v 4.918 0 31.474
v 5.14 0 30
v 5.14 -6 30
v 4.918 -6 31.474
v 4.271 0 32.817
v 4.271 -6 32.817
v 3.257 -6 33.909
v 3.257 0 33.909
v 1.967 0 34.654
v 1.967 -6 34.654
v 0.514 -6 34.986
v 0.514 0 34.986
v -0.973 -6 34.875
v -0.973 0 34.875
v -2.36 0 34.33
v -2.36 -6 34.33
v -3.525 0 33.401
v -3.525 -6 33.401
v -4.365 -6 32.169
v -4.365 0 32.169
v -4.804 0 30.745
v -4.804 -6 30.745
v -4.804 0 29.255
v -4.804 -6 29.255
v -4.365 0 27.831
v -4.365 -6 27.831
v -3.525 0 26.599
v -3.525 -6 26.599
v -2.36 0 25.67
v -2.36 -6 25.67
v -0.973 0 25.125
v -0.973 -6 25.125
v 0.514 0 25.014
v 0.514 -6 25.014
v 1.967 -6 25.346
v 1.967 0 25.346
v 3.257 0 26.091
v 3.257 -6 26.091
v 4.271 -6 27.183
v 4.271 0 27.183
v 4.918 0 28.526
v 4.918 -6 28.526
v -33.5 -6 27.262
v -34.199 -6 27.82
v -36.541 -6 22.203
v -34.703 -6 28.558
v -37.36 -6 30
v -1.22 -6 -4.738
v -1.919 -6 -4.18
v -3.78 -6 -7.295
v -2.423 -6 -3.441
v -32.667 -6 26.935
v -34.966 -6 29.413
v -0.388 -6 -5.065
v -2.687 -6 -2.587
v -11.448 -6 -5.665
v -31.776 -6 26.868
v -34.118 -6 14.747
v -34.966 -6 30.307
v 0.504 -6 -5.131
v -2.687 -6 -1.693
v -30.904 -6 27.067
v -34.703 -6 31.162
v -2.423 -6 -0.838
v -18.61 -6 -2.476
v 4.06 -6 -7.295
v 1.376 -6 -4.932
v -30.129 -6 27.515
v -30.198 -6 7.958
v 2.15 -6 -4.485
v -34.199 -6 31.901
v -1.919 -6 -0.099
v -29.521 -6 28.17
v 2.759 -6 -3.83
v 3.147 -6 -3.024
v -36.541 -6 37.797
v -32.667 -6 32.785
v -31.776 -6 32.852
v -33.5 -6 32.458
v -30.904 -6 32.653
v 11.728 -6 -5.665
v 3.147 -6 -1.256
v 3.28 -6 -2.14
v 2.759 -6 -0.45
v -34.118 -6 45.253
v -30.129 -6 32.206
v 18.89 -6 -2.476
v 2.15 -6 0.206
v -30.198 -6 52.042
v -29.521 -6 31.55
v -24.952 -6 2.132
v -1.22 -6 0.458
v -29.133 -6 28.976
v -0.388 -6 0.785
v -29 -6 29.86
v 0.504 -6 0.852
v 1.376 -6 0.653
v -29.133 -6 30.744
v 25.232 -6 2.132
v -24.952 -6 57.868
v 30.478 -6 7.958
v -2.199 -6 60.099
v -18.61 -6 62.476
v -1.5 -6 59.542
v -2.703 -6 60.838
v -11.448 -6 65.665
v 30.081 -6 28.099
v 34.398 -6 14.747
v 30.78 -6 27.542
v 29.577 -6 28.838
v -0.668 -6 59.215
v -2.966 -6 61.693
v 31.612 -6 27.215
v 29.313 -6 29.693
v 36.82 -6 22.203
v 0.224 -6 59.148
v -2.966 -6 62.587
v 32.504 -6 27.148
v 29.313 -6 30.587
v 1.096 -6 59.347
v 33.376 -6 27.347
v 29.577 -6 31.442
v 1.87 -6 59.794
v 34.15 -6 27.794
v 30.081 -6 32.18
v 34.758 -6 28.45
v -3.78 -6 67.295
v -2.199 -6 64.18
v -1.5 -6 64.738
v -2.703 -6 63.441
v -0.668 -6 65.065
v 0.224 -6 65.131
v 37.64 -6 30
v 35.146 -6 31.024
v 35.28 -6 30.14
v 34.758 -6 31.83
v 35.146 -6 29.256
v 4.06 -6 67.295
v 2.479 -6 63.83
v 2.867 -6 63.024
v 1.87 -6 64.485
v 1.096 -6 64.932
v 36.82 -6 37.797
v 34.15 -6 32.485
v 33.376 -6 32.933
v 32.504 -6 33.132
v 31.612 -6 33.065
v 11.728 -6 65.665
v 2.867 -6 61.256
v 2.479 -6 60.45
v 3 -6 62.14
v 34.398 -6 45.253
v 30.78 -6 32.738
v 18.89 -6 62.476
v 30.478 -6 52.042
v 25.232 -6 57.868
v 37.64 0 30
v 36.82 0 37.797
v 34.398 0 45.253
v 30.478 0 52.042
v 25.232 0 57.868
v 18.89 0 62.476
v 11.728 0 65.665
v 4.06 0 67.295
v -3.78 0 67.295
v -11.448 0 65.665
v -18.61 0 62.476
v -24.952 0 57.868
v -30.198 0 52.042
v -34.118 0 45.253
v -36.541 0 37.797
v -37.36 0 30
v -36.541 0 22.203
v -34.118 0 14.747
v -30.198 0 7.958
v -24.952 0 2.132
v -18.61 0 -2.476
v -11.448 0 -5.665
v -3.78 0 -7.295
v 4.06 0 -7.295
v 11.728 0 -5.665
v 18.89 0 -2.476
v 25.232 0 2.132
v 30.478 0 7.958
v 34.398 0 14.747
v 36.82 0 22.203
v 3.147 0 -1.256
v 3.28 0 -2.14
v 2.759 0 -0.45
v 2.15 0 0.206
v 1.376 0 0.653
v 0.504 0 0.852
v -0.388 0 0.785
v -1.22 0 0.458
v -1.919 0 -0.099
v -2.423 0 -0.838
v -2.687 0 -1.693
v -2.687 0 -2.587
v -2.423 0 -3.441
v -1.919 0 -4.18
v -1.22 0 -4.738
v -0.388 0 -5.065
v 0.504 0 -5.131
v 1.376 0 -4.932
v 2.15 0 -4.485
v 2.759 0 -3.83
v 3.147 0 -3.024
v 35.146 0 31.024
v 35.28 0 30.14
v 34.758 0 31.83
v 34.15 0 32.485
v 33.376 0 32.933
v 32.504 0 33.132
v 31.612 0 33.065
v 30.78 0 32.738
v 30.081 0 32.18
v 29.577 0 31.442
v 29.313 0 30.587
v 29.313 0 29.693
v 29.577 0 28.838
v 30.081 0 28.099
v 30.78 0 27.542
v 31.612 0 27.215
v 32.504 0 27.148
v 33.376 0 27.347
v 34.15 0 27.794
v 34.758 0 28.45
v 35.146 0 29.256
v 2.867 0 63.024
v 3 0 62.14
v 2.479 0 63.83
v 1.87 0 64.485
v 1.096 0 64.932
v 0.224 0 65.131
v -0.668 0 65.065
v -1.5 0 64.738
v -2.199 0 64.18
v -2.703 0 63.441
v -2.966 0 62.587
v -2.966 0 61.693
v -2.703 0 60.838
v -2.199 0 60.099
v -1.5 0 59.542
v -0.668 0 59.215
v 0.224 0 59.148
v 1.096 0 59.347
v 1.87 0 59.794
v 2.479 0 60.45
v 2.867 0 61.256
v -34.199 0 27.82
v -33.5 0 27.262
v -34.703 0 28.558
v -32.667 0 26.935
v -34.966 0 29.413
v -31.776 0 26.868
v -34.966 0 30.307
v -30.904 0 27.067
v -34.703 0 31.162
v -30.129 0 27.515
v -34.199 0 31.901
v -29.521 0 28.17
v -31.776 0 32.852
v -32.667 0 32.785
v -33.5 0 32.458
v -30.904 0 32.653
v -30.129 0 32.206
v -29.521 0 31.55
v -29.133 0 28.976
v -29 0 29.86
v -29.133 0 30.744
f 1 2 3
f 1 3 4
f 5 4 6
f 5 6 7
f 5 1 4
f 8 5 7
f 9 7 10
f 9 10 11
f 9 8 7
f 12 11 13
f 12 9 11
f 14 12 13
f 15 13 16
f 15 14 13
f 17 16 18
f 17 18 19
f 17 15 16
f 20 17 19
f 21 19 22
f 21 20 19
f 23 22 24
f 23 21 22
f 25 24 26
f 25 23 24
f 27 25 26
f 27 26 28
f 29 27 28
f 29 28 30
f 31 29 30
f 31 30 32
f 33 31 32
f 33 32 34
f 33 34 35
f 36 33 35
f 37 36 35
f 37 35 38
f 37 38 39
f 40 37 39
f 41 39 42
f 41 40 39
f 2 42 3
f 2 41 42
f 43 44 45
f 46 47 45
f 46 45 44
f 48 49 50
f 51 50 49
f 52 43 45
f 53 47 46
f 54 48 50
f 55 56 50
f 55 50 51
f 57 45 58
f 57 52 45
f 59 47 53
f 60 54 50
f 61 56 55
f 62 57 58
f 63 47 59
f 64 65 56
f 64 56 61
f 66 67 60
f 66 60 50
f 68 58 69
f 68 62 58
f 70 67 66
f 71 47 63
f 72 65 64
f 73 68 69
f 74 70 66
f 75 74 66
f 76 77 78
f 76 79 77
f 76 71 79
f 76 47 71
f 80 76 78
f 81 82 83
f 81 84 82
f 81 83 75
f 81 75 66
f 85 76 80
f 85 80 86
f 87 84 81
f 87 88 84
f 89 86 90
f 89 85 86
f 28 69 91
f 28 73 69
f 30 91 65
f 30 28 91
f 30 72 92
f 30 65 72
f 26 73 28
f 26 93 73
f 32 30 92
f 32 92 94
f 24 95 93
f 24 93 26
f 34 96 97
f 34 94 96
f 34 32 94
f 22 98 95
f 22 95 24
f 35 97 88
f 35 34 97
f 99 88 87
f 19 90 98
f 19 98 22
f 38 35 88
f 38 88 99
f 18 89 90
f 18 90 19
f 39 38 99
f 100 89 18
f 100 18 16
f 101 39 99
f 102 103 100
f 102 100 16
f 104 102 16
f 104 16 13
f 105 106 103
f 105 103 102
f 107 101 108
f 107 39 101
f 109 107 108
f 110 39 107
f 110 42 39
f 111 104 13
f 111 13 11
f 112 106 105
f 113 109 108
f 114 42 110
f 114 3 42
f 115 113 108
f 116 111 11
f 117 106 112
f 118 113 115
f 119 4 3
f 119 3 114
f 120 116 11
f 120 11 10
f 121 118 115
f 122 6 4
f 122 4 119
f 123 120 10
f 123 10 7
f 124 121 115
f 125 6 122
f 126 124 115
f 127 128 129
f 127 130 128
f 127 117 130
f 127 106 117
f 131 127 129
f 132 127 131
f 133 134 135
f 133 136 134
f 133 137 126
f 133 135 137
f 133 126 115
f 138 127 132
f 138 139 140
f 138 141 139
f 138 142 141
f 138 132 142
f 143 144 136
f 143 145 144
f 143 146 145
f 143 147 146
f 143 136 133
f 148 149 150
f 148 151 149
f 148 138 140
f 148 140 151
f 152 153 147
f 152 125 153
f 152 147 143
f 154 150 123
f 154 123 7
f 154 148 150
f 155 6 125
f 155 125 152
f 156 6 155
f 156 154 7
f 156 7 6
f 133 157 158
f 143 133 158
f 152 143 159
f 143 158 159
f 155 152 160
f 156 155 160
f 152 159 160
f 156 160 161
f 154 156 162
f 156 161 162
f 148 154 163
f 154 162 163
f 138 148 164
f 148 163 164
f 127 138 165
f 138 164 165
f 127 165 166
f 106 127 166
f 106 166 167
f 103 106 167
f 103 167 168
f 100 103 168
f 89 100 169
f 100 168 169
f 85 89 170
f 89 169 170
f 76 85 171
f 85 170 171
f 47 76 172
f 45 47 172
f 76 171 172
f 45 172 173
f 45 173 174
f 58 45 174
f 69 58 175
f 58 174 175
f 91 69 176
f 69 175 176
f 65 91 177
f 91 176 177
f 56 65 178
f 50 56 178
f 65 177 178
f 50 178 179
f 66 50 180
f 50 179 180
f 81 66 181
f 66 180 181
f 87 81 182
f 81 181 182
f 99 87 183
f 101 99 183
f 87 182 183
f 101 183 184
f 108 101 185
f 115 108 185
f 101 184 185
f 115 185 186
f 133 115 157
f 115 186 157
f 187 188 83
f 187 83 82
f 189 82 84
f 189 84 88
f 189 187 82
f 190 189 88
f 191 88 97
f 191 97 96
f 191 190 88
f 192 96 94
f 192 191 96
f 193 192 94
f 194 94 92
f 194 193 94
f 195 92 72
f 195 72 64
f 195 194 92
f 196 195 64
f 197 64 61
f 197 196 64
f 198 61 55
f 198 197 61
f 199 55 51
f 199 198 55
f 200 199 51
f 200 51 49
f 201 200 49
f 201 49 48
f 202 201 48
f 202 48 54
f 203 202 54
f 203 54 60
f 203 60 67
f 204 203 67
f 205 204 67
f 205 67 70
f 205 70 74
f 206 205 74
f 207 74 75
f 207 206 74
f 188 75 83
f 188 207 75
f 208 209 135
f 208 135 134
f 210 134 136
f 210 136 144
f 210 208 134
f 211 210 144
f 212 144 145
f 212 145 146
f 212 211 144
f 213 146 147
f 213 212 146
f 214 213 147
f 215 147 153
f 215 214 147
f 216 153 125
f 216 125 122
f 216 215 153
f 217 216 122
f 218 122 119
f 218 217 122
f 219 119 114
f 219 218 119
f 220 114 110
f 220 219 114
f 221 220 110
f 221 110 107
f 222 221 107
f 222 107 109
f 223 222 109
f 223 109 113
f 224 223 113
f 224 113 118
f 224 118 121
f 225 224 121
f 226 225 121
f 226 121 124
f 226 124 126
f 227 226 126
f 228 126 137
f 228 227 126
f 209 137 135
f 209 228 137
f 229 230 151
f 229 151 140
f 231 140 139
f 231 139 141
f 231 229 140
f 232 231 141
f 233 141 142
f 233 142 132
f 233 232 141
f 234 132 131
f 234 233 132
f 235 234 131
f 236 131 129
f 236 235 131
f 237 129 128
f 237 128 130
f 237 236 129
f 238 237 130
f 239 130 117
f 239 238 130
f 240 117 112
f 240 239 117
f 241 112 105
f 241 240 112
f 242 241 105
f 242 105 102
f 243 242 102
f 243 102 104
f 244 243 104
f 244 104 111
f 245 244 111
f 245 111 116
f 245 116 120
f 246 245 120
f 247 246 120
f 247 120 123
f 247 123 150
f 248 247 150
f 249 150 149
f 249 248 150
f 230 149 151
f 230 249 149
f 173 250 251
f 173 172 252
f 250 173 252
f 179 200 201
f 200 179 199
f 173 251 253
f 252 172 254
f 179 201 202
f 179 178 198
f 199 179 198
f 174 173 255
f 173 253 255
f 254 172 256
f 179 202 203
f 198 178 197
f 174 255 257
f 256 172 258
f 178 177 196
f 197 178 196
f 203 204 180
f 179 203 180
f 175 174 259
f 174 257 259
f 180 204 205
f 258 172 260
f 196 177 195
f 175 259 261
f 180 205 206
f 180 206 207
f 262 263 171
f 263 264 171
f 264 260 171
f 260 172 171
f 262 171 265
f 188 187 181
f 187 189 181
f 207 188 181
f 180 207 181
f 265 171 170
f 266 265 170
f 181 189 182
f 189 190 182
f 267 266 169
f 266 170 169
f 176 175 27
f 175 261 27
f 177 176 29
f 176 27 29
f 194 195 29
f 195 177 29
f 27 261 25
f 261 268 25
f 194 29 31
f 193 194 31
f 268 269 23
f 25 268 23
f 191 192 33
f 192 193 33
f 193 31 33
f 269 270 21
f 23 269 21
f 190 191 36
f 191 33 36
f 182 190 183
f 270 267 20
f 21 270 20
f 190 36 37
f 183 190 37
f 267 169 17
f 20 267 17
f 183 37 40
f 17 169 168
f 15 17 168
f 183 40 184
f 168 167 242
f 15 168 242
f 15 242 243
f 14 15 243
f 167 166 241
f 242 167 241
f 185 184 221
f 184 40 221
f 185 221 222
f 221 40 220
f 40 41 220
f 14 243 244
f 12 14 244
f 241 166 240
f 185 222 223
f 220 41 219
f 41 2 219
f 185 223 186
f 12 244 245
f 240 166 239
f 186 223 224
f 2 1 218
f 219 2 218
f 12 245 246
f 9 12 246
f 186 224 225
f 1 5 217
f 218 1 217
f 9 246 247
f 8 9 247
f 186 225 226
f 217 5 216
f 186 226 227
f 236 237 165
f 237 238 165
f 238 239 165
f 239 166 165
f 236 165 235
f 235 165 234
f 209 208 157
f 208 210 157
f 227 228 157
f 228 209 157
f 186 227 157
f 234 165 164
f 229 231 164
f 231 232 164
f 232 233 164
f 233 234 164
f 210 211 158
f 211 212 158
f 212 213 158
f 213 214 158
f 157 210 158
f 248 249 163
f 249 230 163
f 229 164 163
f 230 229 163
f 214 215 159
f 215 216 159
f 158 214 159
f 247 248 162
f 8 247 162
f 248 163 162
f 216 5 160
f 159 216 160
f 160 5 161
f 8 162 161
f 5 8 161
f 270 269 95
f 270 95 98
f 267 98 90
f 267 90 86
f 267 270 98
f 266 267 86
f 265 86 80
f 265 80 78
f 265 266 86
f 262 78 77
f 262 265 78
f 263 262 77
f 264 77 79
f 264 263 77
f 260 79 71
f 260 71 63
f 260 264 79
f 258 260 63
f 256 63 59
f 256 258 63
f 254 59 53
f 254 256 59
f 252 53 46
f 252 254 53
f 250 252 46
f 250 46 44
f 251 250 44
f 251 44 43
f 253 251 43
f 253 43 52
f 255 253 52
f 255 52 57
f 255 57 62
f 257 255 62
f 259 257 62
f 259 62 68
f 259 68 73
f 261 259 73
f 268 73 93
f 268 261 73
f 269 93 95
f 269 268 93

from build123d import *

# Parameters (mm, degrees)
F0_R     = 37.5
F0_R_2   = 3
F0_R_3   = 5
F1_DEPTH = 6


# Not quite as in the source:
# - a feature names something its author has since deleted; it is built from what else it names


with BuildPart() as f1:
    # F0 (on Front) → F1 (new body)
    with BuildSketch(Plane.XZ):
        with Locations((0.1399259764, 30)):
            Circle(F0_R)
        with Locations((-31.9999092322, 29.8600740236)):
            Circle(F0_R_2, mode=Mode.SUBTRACT)
        with Locations((0.2798519529, -2.1398352087)):
            Circle(F0_R_2, mode=Mode.SUBTRACT)
        with Locations((0, 62.1398352087)):
            Circle(F0_R_2, mode=Mode.SUBTRACT)
        with Locations((0.1399259764, 30)):
            Circle(F0_R_3, mode=Mode.SUBTRACT)
        with Locations((32.2797611851, 30.1399259764)):
            Circle(F0_R_2, mode=Mode.SUBTRACT)
    extrude(amount=F1_DEPTH)


solid = f1.part
